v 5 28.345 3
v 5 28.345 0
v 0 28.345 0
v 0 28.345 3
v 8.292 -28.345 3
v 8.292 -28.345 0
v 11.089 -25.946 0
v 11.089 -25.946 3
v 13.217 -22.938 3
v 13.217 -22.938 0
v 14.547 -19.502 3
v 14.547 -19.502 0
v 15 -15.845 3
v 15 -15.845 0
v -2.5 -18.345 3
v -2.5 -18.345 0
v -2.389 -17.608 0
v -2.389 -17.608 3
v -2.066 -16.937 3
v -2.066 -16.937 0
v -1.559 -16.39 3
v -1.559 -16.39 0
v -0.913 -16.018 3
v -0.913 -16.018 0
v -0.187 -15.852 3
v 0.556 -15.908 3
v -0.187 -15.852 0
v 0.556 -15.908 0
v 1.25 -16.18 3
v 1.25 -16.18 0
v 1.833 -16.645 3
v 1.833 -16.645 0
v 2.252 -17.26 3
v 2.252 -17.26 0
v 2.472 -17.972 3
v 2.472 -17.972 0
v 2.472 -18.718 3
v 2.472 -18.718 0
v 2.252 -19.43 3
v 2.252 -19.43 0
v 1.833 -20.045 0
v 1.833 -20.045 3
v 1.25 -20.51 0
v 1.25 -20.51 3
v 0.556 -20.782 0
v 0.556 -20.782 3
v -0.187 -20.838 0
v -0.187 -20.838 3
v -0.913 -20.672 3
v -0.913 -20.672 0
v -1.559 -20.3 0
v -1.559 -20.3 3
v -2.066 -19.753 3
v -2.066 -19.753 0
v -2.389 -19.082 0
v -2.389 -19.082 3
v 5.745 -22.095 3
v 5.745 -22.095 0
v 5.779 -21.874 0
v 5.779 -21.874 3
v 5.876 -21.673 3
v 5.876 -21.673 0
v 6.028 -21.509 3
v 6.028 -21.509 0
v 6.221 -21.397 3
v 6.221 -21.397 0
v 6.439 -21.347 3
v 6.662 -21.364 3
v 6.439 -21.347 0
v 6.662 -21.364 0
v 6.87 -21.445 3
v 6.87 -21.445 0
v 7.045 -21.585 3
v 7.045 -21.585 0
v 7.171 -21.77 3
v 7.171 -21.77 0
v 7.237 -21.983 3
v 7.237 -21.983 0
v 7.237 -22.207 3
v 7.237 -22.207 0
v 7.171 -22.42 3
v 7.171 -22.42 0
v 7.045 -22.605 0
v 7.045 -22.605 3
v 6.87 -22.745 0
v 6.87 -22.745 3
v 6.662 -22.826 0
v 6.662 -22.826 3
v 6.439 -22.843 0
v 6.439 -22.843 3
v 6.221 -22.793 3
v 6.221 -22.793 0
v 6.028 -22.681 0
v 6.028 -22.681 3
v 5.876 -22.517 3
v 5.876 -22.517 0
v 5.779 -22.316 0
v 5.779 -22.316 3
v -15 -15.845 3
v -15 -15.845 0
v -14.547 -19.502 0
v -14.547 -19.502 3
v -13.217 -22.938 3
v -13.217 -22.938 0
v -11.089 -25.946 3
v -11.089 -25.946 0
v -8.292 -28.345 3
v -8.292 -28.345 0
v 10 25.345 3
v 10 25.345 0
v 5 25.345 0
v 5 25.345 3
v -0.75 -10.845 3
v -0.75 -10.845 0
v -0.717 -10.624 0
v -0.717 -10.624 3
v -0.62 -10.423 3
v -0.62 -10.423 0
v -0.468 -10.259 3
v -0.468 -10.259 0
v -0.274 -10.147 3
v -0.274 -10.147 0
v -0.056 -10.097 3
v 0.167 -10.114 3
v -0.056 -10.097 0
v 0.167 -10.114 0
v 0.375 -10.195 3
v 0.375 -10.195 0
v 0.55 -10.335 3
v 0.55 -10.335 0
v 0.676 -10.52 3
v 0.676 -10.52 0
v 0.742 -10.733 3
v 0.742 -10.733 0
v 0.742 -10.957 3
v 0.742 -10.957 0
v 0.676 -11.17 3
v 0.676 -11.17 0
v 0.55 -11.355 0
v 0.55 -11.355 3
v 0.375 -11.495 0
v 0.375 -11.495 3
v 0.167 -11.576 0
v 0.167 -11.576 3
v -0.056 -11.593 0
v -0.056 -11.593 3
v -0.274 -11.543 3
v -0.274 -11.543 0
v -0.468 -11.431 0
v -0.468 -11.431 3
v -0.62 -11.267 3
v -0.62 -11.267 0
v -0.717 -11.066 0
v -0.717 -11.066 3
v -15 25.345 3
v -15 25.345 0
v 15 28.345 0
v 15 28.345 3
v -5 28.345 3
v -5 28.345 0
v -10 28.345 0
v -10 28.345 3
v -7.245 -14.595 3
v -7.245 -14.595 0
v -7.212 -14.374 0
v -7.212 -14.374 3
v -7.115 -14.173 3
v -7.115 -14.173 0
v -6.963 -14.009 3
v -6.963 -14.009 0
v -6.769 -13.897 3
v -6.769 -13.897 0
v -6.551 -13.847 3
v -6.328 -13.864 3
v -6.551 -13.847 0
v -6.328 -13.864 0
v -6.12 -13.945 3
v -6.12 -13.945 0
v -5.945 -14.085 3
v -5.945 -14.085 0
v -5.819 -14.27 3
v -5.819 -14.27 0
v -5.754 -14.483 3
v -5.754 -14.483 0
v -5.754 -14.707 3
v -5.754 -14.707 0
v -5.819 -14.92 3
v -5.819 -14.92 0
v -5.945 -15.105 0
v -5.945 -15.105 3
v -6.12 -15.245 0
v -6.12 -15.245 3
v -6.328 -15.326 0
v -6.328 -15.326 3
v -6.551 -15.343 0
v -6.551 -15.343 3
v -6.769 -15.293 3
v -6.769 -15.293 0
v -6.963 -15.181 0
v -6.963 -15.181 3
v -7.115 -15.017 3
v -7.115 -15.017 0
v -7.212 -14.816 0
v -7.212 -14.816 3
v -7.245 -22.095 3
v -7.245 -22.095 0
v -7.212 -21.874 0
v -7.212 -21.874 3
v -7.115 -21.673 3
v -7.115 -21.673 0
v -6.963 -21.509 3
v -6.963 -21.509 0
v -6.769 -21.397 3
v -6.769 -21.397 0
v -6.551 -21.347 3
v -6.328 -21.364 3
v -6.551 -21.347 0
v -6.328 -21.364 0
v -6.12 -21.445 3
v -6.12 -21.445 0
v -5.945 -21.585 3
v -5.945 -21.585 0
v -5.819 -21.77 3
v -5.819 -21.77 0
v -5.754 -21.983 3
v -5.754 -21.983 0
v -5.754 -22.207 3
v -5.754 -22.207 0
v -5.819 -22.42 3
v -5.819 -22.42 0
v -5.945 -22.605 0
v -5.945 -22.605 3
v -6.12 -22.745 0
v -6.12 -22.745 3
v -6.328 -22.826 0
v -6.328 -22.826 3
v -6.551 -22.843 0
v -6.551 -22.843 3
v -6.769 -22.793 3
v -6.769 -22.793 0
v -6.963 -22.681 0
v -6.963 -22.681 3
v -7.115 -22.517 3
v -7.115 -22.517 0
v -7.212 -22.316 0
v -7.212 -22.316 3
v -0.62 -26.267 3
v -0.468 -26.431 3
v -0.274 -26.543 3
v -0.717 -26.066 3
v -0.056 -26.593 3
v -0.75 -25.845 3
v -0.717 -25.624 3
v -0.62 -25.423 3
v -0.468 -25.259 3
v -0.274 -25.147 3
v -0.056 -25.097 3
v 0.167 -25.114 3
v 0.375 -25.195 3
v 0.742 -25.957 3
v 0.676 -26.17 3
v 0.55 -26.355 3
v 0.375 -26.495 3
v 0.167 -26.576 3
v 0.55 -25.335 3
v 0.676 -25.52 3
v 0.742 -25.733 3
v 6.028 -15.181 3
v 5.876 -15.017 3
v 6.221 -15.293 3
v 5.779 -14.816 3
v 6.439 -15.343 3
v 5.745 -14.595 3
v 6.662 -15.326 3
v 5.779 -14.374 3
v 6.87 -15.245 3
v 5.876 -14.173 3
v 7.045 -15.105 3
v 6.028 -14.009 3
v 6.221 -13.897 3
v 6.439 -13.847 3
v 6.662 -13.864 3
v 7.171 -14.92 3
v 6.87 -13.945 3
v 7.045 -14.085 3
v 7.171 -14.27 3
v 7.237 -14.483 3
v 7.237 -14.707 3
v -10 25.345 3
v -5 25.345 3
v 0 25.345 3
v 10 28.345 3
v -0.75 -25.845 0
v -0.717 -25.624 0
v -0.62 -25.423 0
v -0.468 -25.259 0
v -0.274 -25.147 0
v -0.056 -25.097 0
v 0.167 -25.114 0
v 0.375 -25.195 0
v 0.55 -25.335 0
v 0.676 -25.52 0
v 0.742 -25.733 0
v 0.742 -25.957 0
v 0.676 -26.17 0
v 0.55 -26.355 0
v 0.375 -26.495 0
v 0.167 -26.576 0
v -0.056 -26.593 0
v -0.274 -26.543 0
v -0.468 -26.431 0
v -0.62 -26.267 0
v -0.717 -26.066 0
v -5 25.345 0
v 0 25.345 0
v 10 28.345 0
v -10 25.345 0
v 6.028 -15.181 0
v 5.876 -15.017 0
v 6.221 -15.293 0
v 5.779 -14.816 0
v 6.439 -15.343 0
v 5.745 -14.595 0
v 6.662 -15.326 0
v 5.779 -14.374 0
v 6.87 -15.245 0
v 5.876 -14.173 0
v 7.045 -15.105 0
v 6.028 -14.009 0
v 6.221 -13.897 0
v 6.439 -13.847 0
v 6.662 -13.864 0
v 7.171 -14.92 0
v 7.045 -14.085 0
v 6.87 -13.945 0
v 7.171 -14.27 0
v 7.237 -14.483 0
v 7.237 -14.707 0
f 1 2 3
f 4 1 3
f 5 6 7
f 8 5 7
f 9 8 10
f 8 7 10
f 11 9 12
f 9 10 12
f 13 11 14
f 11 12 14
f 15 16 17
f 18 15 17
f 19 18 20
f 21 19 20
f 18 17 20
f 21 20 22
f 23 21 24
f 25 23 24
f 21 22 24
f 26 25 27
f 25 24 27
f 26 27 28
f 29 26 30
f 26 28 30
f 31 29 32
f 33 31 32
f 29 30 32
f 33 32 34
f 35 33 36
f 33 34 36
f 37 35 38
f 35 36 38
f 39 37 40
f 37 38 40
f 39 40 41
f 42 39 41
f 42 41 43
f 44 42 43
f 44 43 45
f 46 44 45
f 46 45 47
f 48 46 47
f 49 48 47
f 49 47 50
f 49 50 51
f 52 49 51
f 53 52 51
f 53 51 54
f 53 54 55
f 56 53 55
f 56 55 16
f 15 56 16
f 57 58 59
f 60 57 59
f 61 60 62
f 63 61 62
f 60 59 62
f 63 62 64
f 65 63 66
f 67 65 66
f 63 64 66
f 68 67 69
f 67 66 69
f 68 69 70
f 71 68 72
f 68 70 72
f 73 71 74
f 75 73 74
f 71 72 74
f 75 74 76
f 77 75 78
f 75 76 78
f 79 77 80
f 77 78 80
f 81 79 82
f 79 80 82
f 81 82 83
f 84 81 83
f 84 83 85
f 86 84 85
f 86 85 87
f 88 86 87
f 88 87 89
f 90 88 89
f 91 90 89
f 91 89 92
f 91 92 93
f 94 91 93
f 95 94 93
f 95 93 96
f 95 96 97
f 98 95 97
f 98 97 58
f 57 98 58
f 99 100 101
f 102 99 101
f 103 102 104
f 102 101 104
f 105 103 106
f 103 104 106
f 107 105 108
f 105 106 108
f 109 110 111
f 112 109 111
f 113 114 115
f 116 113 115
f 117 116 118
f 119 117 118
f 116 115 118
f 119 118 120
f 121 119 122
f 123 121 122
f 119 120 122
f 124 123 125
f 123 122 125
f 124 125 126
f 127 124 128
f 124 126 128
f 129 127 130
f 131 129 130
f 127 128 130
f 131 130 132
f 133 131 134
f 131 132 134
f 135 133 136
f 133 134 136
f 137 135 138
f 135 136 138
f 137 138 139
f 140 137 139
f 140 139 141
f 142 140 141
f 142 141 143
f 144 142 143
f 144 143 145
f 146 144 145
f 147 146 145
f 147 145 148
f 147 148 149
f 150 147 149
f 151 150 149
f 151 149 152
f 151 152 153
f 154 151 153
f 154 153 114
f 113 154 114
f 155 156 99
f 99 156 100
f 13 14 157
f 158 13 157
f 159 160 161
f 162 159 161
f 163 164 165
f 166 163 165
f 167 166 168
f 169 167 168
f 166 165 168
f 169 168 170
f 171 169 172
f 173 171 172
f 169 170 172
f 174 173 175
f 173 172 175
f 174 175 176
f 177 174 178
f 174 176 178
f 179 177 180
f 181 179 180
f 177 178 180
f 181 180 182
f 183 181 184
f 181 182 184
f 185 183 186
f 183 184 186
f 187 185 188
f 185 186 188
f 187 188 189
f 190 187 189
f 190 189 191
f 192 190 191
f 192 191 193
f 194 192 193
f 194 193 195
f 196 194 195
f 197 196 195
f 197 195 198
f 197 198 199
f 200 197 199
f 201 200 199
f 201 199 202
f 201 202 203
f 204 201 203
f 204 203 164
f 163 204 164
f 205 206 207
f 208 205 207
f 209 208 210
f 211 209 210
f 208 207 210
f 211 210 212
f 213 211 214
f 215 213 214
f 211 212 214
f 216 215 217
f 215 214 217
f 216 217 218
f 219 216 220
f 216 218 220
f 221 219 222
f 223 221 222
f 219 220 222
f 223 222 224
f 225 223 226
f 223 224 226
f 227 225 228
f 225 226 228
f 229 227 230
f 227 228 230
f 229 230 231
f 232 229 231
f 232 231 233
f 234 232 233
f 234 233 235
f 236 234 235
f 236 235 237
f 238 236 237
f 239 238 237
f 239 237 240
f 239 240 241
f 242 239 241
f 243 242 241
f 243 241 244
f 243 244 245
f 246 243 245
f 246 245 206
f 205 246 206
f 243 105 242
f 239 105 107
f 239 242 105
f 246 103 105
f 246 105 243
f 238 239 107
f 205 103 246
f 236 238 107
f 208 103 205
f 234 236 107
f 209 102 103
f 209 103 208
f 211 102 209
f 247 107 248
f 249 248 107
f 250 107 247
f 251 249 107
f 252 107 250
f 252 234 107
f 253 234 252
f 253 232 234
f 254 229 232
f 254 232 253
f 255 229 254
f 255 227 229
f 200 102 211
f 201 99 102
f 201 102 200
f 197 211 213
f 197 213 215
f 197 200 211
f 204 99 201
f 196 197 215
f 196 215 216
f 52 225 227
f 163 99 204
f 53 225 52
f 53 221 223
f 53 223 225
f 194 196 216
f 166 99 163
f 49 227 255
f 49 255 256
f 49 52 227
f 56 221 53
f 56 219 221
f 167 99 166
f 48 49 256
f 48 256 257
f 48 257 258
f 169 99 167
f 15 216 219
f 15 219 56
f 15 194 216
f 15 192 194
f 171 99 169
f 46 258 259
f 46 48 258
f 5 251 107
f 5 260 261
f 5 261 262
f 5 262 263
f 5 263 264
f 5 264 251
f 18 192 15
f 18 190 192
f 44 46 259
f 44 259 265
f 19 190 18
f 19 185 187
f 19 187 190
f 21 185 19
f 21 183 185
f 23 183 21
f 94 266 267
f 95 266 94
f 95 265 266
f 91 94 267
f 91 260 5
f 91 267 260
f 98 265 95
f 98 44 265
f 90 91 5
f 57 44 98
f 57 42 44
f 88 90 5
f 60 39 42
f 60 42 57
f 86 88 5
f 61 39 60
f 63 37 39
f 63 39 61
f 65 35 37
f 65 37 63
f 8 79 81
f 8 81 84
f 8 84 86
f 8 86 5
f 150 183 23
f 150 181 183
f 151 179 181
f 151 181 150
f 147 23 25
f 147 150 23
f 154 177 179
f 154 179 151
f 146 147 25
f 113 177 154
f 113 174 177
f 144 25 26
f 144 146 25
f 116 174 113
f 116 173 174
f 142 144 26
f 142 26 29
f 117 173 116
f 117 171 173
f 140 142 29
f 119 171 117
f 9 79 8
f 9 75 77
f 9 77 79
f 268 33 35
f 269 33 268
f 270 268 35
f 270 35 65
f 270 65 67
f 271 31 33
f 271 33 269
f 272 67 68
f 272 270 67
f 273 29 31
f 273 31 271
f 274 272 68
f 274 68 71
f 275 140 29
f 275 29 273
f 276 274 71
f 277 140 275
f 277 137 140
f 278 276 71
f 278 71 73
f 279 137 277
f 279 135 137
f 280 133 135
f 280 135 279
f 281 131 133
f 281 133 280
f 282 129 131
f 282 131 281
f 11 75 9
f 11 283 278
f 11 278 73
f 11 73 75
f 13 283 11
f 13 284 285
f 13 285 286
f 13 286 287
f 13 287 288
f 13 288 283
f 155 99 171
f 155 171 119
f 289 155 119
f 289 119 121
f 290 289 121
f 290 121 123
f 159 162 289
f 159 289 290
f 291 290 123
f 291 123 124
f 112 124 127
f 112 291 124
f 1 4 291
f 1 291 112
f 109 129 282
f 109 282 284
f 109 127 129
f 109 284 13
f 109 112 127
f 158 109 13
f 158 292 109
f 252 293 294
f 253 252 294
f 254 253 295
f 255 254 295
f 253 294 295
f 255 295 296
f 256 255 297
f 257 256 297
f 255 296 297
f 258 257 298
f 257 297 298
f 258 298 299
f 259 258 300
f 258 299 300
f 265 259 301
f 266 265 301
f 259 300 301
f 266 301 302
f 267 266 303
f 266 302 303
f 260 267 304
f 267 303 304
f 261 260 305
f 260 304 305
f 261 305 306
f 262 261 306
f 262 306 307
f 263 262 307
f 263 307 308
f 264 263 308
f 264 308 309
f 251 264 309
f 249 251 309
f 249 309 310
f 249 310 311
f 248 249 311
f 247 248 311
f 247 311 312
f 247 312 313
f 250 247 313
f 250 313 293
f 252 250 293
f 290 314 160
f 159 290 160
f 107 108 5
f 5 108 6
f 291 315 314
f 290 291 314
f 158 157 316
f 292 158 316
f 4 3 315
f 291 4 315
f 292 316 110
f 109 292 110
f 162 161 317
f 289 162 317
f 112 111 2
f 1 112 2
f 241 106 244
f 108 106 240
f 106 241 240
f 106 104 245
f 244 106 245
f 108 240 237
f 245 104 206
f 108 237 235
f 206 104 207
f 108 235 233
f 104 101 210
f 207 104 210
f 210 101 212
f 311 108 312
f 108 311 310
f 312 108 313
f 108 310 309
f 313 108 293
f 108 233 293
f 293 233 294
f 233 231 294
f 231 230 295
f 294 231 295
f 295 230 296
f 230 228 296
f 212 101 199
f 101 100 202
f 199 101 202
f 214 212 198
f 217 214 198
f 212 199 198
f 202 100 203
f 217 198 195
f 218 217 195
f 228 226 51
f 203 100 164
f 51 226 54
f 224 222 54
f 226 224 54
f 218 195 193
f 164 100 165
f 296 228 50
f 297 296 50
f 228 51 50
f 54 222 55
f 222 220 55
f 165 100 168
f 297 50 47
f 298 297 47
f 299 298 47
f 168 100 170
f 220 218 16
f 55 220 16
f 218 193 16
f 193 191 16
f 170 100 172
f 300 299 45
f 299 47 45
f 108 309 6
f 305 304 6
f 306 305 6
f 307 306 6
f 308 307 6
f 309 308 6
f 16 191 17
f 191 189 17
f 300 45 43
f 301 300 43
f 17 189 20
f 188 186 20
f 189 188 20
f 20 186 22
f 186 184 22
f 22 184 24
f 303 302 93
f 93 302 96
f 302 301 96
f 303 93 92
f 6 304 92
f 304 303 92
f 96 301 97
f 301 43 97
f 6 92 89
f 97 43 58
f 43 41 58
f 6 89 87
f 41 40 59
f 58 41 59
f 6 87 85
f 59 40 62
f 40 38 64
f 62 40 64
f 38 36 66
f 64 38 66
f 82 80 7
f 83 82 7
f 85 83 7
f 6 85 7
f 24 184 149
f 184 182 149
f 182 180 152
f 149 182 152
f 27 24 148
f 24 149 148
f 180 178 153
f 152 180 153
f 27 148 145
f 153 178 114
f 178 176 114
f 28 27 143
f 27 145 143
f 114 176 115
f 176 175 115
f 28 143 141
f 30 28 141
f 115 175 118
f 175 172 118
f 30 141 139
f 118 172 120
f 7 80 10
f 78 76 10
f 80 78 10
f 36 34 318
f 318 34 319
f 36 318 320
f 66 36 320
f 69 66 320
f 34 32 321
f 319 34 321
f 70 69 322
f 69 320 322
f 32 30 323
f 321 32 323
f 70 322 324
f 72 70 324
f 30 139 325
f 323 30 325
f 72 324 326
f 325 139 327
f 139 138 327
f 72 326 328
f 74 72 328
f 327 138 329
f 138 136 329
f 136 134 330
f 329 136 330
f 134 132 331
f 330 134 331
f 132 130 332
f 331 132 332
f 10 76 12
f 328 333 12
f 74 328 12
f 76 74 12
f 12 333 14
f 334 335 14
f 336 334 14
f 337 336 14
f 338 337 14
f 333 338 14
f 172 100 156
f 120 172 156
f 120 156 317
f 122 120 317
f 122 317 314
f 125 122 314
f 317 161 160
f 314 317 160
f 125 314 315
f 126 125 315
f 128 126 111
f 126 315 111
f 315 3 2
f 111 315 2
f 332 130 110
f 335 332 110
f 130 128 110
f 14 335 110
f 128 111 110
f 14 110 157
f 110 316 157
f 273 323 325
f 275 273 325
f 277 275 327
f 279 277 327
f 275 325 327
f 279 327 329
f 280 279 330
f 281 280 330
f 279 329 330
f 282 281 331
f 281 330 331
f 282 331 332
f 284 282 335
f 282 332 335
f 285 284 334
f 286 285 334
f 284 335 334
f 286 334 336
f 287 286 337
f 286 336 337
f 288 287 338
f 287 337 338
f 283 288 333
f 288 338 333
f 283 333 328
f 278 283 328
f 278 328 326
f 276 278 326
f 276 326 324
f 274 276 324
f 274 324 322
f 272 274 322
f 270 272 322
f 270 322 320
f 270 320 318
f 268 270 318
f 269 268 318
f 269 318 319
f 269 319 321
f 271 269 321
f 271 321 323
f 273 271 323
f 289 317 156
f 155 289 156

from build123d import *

# Parameters (mm, degrees)
SALIENTE_EXTRUIR1_DEPTH = 3
CORTAR_EXTRUIR1_DEPTH   = 3
CORTAR_EXTRUIR2_REACH   = 34.209
CROQUIS3_R              = 0.75
CROQUIS3_R_2            = 2.5


with BuildPart() as part:
    # Croquis1 → Saliente-Extruir1 (new body)
    with BuildSketch(Plane.XY):
        Polygon((-15, -28.345), (15, -28.345), (15, 28.345), (10, 28.345), (10, 25.345), (5, 25.345), (5, 28.345), (0, 28.345), (0, 25.345), (-5, 25.345), (-5, 28.345), (-10, 28.345), (-10, 25.345), (-15, 25.345), align=None)
    extrude(amount=SALIENTE_EXTRUIR1_DEPTH)

    # Croquis2 → Cortar-Extruir1 (cut)
    with BuildSketch(Plane(origin=(0, 0, 0), x_dir=(-1, 0, 0), z_dir=(0, 0, -1))):
        with BuildLine():
            Line((-15, -15.845), (-21.186751232, -15.845))
            Line((-21.186751232, -15.845), (-21.186751232, -34.648085908))
            Line((-21.186751232, -34.648085908), (21.188955731, -34.648085908))
            Line((21.188955731, -34.648085908), (21.188955731, -15.845))
            Line((21.188955731, -15.845), (15, -15.845))
            ThreePointArc((15, -15.845), (0, -30.845), (-15, -15.845))
        make_face()
    extrude(amount=-CORTAR_EXTRUIR1_DEPTH, mode=Mode.SUBTRACT)

    # Croquis3 → Cortar-Extruir2 (cut, up to next)
    with BuildSketch(Plane(origin=(0, 0, 0), x_dir=(-1, 0, 0), z_dir=(0, 0, -1)), mode=Mode.PRIVATE) as cortar_extruir2_sk1:
        with Locations((0, -10.845)):
            Circle(CROQUIS3_R)
    cortar_extruir2_tool1 = extrude(cortar_extruir2_sk1.sketch, amount=-CORTAR_EXTRUIR2_REACH, mode=Mode.PRIVATE) & part.part
    # Croquis3 → Cortar-Extruir2 (cut, up to next)
    with BuildSketch(Plane(origin=(0, 0, 0), x_dir=(-1, 0, 0), z_dir=(0, 0, -1)), mode=Mode.PRIVATE) as cortar_extruir2_sk2:
        with Locations((6.495190528, -14.595)):
            Circle(CROQUIS3_R)
    cortar_extruir2_tool2 = extrude(cortar_extruir2_sk2.sketch, amount=-CORTAR_EXTRUIR2_REACH, mode=Mode.PRIVATE) & part.part
    # Croquis3 → Cortar-Extruir2 (cut, up to next)
    with BuildSketch(Plane(origin=(0, 0, 0), x_dir=(-1, 0, 0), z_dir=(0, 0, -1)), mode=Mode.PRIVATE) as cortar_extruir2_sk3:
        with Locations((6.495190528, -22.095)):
            Circle(CROQUIS3_R)
    cortar_extruir2_tool3 = extrude(cortar_extruir2_sk3.sketch, amount=-CORTAR_EXTRUIR2_REACH, mode=Mode.PRIVATE) & part.part
    # Croquis3 → Cortar-Extruir2 (cut, up to next)
    with BuildSketch(Plane(origin=(0, 0, 0), x_dir=(-1, 0, 0), z_dir=(0, 0, -1)), mode=Mode.PRIVATE) as cortar_extruir2_sk4:
        with Locations((0, -25.845)):
            Circle(CROQUIS3_R)
    cortar_extruir2_tool4 = extrude(cortar_extruir2_sk4.sketch, amount=-CORTAR_EXTRUIR2_REACH, mode=Mode.PRIVATE) & part.part
    # Croquis3 → Cortar-Extruir2 (cut, up to next)
    with BuildSketch(Plane(origin=(0, 0, 0), x_dir=(-1, 0, 0), z_dir=(0, 0, -1)), mode=Mode.PRIVATE) as cortar_extruir2_sk5:
        with Locations((-6.495190528, -22.095)):
            Circle(CROQUIS3_R)
    cortar_extruir2_tool5 = extrude(cortar_extruir2_sk5.sketch, amount=-CORTAR_EXTRUIR2_REACH, mode=Mode.PRIVATE) & part.part
    # Croquis3 → Cortar-Extruir2 (cut, up to next)
    with BuildSketch(Plane(origin=(0, 0, 0), x_dir=(-1, 0, 0), z_dir=(0, 0, -1)), mode=Mode.PRIVATE) as cortar_extruir2_sk6:
        with Locations((-6.495190528, -14.595)):
            Circle(CROQUIS3_R)
    cortar_extruir2_tool6 = extrude(cortar_extruir2_sk6.sketch, amount=-CORTAR_EXTRUIR2_REACH, mode=Mode.PRIVATE) & part.part
    # Croquis3 → Cortar-Extruir2 (cut, up to next)
    with BuildSketch(Plane(origin=(0, 0, 0), x_dir=(-1, 0, 0), z_dir=(0, 0, -1)), mode=Mode.PRIVATE) as cortar_extruir2_sk7:
        with Locations((0, -18.345)):
            Circle(CROQUIS3_R_2)
    cortar_extruir2_tool7 = extrude(cortar_extruir2_sk7.sketch, amount=-CORTAR_EXTRUIR2_REACH, mode=Mode.PRIVATE) & part.part
    add(cortar_extruir2_tool1.solids().sort_by_distance((0, -10.845, 0))[0], mode=Mode.SUBTRACT)
    add(cortar_extruir2_tool2.solids().sort_by_distance((-6.495191, -14.595, 0))[0], mode=Mode.SUBTRACT)
    add(cortar_extruir2_tool3.solids().sort_by_distance((-6.495191, -22.095, 0))[0], mode=Mode.SUBTRACT)
    add(cortar_extruir2_tool4.solids().sort_by_distance((0, -25.845, 0))[0], mode=Mode.SUBTRACT)
    add(cortar_extruir2_tool5.solids().sort_by_distance((6.495191, -22.095, 0))[0], mode=Mode.SUBTRACT)
    add(cortar_extruir2_tool6.solids().sort_by_distance((6.495191, -14.595, 0))[0], mode=Mode.SUBTRACT)
    add(cortar_extruir2_tool7.solids().sort_by_distance((0, -18.345, 0))[0], mode=Mode.SUBTRACT)


solid = part.part
